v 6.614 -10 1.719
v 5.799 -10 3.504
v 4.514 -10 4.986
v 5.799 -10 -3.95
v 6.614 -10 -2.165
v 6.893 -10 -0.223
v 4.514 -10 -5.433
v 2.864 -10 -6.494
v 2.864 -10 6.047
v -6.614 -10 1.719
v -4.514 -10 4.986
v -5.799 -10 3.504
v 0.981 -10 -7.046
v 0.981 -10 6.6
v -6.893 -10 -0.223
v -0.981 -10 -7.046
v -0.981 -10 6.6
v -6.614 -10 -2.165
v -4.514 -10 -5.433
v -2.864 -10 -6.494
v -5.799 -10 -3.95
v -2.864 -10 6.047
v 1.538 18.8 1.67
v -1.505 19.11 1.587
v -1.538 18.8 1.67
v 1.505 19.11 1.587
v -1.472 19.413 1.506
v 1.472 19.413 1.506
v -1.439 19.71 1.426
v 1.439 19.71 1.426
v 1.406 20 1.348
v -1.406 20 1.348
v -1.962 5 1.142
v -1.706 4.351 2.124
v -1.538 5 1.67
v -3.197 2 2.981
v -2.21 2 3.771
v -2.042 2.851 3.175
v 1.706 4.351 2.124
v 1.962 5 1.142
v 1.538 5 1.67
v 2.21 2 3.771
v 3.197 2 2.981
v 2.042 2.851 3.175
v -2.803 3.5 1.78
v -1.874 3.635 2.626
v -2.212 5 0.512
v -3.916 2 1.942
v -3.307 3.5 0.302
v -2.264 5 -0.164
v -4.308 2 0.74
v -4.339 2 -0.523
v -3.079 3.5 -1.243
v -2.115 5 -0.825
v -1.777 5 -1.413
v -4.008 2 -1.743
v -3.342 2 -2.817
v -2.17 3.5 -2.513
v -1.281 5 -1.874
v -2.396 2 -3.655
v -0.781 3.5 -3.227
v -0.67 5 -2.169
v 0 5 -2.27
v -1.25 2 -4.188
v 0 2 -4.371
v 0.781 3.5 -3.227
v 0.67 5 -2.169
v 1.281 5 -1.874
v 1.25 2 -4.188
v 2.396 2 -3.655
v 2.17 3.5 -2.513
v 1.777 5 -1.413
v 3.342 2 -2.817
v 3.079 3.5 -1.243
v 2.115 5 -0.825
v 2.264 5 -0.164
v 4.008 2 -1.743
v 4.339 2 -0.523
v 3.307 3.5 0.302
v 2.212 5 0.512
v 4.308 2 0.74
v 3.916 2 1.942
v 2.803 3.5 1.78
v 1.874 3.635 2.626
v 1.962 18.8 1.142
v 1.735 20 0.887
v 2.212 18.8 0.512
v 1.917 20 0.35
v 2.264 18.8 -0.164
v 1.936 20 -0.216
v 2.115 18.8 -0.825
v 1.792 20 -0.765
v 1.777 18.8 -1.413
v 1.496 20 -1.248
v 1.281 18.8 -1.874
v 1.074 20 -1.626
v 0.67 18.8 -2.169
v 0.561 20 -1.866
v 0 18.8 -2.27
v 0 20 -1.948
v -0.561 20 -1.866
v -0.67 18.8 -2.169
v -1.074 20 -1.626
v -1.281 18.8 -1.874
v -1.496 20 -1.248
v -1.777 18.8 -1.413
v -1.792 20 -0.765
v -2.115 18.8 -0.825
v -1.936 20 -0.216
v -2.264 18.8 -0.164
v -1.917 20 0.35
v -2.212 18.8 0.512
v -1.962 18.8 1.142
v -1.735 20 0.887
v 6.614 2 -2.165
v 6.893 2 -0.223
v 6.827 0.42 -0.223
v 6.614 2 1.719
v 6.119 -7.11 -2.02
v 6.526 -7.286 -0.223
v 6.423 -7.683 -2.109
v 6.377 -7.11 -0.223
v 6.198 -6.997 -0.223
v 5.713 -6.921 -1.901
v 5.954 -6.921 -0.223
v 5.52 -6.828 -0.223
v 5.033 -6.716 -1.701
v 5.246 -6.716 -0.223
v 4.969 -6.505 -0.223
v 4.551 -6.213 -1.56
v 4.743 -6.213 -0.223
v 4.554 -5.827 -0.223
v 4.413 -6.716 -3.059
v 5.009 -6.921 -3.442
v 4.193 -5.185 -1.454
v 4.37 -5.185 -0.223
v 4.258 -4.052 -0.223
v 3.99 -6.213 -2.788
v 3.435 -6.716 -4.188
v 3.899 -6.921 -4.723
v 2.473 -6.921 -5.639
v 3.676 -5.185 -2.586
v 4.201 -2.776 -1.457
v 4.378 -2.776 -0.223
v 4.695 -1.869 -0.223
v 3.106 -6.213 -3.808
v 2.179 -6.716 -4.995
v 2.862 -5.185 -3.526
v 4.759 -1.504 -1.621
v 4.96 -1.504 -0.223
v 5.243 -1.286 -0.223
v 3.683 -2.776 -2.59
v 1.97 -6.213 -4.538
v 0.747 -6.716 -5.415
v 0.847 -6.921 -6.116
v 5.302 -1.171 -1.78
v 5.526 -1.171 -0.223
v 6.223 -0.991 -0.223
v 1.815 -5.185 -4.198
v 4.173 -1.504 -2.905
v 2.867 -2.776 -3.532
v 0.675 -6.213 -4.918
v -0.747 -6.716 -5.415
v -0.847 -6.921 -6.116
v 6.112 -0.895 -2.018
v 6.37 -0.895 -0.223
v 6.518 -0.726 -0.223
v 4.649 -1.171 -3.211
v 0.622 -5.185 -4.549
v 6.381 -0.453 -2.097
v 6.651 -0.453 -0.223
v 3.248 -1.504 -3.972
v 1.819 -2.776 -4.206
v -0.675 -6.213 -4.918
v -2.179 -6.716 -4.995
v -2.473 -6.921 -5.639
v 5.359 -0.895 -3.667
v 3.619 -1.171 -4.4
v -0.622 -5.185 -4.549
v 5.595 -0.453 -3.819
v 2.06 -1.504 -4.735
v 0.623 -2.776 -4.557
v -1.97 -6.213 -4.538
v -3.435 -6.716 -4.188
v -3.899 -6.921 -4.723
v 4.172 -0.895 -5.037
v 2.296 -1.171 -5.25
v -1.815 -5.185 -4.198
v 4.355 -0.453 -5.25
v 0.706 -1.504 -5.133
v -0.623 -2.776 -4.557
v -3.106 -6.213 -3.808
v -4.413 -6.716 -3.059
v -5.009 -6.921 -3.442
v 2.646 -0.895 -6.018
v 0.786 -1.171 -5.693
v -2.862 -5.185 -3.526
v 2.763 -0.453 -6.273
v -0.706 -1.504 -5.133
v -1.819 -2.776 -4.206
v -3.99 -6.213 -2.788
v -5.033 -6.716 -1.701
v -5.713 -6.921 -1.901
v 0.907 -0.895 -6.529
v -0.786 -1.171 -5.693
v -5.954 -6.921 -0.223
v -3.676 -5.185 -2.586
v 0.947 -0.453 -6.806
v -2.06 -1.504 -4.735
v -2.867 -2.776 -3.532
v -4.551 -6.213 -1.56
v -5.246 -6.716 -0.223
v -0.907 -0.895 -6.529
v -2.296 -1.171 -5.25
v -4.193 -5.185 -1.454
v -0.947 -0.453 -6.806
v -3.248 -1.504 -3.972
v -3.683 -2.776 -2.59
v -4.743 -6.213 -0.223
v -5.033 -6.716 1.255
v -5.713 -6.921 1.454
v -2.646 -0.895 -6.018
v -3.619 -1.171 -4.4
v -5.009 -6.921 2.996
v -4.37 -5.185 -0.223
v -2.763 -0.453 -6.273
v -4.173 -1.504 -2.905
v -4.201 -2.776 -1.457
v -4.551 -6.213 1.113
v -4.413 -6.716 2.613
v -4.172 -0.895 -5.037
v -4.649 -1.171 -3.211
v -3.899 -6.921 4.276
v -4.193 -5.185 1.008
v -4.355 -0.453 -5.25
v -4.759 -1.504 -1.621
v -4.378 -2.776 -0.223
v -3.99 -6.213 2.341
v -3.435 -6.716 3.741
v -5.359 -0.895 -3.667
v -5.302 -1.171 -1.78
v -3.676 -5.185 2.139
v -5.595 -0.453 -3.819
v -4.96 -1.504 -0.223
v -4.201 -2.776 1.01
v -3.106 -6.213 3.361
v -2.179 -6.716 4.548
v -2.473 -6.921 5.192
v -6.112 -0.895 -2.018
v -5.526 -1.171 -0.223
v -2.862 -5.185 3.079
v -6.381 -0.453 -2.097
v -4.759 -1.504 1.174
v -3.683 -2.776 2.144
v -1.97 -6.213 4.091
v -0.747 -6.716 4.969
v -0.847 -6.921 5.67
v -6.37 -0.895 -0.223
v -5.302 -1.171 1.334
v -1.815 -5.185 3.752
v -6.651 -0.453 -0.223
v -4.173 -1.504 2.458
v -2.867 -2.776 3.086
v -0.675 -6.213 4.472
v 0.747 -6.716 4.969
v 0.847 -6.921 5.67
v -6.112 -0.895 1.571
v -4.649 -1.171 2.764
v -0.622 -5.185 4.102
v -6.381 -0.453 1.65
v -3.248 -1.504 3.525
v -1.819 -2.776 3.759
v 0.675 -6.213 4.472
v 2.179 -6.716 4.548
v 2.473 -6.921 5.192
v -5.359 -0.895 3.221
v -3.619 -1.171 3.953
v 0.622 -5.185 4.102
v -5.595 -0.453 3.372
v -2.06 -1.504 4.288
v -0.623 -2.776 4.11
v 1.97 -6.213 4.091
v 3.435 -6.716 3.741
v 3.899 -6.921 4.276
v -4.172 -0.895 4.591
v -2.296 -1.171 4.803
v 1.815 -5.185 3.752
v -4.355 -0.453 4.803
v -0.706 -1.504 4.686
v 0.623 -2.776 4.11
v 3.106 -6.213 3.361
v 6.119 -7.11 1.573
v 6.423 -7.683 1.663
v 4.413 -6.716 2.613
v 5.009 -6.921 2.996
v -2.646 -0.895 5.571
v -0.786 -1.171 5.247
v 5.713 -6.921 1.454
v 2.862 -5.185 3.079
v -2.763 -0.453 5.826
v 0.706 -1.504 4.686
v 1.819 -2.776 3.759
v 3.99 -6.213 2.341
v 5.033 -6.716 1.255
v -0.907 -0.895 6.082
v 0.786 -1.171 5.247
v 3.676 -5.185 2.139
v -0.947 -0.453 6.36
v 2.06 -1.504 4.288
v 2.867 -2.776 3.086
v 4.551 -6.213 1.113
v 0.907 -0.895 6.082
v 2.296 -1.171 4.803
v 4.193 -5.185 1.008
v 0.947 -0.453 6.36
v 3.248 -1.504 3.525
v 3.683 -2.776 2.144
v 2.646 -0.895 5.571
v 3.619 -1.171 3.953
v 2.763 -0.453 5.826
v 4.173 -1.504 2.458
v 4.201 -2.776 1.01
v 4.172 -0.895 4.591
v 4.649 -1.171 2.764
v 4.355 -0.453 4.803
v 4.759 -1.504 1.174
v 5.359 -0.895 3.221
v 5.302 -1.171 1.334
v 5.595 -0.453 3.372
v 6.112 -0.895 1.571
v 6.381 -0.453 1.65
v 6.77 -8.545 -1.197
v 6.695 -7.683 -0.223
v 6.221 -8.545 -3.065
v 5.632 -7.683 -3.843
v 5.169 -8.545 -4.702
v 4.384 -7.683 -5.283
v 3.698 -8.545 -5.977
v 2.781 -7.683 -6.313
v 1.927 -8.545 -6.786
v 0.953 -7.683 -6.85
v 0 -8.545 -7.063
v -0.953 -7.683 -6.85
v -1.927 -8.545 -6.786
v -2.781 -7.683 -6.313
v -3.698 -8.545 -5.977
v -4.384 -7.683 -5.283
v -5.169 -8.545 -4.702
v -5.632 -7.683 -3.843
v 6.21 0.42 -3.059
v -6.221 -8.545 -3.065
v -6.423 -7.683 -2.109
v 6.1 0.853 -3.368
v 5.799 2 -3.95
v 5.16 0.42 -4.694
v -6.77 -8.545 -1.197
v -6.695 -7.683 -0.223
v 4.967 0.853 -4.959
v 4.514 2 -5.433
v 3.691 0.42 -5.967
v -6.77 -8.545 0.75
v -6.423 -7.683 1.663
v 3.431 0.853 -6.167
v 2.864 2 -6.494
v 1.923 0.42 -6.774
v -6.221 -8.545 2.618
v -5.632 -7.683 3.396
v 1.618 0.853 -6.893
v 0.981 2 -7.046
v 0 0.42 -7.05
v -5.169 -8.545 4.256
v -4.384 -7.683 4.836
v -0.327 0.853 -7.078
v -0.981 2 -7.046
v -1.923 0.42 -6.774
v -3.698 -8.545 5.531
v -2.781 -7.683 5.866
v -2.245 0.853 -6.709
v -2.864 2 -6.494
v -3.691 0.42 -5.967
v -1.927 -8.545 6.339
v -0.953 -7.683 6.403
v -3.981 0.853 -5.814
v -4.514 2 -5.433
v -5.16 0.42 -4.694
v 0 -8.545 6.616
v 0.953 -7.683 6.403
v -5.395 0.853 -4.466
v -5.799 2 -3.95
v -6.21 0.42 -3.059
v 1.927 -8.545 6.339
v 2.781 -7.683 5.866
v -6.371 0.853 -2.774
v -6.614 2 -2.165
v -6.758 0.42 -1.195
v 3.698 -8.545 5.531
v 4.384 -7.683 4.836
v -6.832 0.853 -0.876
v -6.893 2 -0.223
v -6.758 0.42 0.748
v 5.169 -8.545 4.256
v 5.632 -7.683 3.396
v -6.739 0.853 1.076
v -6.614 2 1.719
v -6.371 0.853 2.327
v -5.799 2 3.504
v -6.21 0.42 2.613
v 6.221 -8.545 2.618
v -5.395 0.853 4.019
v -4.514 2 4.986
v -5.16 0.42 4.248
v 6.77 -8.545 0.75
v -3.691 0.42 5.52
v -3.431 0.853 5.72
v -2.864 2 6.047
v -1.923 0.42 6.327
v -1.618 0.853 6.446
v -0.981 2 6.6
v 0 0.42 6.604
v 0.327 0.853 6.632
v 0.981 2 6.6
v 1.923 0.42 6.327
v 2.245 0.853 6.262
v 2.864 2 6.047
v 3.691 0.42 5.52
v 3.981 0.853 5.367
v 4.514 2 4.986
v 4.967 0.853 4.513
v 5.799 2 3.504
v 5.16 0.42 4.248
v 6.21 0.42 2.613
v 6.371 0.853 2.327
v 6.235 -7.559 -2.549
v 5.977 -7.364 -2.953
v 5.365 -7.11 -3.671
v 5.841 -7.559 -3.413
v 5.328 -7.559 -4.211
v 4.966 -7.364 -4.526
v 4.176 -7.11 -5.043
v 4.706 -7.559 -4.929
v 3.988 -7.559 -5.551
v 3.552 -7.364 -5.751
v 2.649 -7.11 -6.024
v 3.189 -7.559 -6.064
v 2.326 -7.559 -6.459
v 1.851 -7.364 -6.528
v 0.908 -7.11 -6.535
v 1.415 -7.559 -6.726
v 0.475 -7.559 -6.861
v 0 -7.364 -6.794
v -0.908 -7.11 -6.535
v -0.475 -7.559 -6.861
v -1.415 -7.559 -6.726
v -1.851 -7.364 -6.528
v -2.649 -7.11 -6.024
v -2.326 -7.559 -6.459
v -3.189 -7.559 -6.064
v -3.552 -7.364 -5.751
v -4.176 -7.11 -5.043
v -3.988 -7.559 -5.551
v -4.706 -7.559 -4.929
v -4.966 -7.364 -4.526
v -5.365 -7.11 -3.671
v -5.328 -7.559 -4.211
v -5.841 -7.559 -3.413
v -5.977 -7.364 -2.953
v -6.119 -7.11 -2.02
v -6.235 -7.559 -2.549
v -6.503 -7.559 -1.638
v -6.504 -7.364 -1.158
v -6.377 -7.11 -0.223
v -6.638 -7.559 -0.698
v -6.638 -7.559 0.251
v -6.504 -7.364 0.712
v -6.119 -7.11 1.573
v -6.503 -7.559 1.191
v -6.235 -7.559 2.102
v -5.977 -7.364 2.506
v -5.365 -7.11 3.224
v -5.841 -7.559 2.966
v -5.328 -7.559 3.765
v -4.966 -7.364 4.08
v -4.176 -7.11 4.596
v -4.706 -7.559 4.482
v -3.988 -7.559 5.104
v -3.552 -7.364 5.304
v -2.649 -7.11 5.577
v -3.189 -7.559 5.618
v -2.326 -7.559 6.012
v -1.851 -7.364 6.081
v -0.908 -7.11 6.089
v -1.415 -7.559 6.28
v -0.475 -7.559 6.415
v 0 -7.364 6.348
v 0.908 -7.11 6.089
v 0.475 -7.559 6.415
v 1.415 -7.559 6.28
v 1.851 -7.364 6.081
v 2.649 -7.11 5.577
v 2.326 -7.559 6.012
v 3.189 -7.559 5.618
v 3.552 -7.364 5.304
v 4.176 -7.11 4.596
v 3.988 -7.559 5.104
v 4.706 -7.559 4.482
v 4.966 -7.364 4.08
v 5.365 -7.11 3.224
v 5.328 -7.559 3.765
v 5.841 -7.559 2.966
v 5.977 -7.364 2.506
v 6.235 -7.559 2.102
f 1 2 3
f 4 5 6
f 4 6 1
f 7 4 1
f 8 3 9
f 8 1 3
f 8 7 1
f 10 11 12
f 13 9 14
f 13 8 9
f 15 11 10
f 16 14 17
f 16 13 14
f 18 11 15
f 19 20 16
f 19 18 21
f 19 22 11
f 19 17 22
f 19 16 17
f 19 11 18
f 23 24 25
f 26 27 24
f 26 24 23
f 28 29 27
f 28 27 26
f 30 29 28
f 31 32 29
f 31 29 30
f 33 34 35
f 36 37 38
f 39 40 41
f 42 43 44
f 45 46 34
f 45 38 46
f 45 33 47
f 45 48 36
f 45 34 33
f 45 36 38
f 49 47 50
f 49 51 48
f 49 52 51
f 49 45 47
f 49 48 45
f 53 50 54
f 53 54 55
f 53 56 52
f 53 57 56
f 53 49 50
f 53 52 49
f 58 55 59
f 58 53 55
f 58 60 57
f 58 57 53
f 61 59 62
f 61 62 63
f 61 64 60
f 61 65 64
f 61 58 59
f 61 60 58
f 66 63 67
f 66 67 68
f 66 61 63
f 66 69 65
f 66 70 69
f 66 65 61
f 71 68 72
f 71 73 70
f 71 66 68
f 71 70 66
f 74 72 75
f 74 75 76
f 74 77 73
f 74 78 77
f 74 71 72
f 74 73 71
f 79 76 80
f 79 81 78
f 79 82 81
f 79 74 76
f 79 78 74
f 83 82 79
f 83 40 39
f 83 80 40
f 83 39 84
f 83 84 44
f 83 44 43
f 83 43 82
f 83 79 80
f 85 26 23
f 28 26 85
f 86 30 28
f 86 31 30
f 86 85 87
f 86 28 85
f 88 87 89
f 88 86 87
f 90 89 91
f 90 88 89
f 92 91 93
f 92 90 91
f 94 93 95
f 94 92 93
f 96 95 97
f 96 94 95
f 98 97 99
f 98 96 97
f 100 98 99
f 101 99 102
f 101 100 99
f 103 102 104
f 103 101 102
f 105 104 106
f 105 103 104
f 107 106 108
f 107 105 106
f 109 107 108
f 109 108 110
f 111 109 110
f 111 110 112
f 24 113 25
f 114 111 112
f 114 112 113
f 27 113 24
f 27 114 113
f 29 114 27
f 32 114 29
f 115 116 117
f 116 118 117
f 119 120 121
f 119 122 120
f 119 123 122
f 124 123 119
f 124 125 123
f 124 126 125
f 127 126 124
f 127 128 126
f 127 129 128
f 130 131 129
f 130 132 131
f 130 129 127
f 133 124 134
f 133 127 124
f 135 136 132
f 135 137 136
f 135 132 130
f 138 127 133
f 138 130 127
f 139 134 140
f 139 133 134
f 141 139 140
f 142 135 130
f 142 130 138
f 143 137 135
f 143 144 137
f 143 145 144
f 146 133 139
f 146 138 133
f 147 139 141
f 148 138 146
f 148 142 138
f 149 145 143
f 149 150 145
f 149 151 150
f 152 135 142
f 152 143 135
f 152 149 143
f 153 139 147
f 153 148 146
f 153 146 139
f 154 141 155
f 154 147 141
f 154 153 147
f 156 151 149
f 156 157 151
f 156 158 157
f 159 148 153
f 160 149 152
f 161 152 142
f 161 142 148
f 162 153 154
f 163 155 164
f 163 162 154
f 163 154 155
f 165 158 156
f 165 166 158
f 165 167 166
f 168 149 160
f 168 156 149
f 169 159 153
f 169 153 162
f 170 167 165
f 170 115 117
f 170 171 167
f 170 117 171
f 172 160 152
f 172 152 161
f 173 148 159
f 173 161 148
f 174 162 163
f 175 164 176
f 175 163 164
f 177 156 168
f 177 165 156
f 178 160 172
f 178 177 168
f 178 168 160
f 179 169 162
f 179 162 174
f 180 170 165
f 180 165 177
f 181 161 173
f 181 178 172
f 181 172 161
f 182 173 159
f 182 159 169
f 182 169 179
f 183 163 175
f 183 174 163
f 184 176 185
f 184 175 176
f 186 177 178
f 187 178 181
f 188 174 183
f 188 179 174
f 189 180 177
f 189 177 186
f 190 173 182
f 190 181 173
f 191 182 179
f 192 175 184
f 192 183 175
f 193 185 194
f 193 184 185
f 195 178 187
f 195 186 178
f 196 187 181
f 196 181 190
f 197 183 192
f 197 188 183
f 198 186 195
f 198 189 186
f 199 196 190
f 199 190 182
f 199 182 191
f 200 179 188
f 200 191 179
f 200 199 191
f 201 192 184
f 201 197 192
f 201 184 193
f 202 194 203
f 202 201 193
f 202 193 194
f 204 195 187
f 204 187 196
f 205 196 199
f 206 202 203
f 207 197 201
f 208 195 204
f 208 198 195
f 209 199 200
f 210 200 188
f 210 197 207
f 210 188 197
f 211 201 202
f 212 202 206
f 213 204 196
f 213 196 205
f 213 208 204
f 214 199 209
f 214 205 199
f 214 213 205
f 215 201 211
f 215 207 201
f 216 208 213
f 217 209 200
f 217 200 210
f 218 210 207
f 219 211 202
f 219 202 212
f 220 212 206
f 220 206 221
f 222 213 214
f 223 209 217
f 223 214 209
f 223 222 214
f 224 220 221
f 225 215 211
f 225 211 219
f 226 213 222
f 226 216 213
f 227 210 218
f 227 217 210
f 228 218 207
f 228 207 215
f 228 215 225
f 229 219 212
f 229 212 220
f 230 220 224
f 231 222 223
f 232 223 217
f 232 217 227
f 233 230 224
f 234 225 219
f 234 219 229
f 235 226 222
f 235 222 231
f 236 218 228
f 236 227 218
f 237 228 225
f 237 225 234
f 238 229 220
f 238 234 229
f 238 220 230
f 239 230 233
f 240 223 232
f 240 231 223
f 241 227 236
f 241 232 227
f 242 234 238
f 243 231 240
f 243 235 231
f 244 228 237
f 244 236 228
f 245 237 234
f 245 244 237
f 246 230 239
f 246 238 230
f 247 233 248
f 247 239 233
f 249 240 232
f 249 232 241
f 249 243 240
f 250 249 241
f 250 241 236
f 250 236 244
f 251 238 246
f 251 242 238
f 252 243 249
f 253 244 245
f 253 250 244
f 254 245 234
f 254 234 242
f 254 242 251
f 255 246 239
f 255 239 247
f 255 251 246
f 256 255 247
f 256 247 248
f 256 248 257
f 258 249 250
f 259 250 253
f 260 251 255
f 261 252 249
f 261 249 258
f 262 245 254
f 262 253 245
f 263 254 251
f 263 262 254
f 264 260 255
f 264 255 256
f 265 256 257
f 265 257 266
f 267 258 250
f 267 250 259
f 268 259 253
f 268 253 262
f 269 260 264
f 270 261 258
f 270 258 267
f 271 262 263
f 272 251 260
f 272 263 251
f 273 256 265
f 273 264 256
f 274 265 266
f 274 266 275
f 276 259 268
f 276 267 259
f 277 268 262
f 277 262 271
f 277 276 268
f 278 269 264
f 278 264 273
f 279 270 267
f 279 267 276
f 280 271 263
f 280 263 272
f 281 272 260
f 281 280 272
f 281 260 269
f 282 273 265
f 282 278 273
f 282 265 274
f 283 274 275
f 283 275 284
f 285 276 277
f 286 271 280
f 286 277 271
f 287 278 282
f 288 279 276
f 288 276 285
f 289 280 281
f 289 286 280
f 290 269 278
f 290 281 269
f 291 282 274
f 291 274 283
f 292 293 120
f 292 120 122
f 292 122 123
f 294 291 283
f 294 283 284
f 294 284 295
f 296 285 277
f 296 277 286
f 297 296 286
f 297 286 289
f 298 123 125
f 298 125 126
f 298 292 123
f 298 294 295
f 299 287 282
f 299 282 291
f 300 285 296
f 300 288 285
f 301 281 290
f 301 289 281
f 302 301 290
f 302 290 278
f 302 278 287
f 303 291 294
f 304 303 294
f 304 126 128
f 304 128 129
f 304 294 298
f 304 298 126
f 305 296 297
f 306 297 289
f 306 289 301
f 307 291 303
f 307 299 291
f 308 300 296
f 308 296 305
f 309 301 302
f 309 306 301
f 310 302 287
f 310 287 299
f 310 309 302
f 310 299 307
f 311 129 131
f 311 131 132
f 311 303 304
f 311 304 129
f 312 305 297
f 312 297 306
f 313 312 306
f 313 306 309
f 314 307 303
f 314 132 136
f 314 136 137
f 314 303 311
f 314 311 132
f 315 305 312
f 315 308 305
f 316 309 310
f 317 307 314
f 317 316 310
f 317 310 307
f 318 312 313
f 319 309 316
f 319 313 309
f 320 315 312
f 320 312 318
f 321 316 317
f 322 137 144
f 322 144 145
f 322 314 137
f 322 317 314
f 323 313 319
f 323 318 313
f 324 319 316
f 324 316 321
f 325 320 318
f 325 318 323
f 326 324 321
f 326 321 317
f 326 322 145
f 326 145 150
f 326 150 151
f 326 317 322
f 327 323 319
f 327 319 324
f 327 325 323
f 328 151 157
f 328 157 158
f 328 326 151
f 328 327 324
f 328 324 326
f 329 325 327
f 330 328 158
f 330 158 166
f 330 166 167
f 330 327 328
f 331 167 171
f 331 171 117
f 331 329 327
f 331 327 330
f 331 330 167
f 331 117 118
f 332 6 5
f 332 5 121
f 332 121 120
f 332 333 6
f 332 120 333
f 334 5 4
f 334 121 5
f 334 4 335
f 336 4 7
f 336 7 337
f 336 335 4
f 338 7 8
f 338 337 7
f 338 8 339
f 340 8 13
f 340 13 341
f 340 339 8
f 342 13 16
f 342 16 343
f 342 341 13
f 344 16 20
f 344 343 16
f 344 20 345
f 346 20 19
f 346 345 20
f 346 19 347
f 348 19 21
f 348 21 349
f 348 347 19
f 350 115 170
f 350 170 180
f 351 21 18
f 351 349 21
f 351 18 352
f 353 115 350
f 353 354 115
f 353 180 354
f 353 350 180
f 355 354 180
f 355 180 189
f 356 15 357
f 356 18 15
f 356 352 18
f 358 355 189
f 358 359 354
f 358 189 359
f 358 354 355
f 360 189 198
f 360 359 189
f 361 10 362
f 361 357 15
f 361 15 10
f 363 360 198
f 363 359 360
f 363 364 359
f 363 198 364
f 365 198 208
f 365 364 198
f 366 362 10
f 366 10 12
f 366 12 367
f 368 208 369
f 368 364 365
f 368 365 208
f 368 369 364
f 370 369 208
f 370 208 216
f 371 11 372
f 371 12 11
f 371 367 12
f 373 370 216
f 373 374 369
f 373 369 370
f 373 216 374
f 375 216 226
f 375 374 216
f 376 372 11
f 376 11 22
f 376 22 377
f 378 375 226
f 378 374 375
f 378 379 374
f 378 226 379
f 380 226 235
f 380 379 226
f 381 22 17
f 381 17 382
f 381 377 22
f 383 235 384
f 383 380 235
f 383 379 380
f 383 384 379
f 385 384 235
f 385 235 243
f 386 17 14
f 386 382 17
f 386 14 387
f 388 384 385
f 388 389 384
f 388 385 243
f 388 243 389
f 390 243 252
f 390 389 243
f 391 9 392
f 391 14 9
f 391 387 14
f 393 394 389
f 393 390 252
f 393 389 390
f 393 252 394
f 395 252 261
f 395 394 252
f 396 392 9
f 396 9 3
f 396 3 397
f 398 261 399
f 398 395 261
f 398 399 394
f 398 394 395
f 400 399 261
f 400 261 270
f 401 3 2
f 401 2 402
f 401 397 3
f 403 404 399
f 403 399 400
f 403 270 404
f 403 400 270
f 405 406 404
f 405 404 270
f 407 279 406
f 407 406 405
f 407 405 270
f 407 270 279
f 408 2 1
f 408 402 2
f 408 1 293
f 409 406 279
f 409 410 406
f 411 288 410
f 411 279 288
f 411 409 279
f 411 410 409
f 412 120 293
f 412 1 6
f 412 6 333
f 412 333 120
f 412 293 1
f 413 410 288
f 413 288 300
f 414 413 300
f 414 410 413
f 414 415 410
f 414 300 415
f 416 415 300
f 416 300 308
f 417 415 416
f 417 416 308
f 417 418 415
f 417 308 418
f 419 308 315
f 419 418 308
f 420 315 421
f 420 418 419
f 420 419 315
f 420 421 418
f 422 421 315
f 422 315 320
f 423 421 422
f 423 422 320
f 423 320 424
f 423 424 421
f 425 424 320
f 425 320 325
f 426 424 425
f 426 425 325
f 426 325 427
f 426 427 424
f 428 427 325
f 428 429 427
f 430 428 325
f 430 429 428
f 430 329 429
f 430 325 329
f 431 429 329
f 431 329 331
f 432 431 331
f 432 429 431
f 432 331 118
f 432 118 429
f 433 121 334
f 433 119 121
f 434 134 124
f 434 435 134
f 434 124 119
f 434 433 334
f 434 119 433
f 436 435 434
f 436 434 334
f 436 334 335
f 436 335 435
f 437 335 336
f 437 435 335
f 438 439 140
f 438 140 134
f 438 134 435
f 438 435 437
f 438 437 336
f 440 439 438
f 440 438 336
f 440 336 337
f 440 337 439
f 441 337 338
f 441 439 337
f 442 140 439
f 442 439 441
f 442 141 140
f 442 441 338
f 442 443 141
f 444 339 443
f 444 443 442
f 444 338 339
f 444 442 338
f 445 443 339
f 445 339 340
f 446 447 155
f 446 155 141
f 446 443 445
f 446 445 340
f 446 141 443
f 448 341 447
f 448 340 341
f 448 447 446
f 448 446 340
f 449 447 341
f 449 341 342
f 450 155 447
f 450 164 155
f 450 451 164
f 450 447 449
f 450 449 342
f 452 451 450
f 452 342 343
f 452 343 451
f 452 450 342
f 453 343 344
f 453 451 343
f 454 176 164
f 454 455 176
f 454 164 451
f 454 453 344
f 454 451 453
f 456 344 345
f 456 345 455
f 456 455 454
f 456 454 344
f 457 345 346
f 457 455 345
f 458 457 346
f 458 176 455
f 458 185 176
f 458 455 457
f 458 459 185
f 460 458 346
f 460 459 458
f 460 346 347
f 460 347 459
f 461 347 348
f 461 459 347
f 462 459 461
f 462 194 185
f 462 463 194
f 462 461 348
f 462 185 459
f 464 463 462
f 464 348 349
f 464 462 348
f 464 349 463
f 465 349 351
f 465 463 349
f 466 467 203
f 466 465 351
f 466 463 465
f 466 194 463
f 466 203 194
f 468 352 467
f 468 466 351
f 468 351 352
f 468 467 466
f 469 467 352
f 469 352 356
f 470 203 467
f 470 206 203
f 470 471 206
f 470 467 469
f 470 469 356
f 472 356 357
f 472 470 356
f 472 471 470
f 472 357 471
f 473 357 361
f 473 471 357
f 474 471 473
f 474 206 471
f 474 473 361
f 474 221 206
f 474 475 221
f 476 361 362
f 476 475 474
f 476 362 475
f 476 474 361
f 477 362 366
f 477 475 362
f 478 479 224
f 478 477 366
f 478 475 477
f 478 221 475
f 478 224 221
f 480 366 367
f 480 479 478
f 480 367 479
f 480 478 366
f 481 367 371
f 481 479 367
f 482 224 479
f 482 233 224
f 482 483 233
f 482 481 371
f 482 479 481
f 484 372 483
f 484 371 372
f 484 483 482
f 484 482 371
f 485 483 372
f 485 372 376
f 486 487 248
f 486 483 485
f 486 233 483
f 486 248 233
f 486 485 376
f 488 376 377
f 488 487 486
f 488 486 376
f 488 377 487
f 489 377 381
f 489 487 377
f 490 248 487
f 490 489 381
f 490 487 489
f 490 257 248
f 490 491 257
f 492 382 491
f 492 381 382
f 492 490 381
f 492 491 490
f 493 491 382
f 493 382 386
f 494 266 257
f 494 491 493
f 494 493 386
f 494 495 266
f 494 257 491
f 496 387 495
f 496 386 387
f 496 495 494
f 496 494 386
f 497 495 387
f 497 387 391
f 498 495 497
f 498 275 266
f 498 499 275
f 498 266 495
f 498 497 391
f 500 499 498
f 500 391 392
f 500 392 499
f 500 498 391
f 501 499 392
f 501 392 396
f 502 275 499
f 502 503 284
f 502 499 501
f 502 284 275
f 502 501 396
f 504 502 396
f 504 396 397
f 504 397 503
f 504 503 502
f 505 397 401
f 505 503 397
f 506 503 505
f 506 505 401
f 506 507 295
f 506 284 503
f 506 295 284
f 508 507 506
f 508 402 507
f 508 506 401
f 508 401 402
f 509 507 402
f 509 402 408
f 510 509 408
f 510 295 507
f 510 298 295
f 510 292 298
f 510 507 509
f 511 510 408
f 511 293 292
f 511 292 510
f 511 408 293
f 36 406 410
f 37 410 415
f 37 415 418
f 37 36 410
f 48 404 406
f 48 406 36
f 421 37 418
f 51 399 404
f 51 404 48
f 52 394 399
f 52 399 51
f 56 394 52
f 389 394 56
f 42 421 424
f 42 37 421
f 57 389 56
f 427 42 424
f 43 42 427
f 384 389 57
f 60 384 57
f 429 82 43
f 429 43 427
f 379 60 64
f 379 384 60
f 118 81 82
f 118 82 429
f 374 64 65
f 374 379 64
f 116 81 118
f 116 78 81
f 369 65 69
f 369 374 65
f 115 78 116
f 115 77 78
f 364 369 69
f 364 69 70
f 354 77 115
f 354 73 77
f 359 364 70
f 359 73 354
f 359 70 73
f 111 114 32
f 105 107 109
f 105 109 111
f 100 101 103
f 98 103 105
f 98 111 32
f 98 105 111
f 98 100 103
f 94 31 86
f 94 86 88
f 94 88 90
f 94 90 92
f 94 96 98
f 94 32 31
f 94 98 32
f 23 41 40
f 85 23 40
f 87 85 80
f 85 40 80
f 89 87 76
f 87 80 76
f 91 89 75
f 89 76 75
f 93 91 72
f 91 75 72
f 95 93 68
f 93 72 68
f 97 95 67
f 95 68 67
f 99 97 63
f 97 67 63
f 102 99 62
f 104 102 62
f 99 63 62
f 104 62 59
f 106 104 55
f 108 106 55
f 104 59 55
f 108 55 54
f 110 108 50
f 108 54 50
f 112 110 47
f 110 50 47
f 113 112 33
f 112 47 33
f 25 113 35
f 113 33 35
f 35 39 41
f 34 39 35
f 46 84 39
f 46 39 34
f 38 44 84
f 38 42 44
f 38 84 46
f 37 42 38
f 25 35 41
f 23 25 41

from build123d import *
from OCP.BRepFilletAPI import BRepFilletAPI_MakeChamfer

# Parameters (mm, degrees)
BOSS_EXTRUDE1_DEPTH = 20
CHAMFER1_SIZE       = 1.2
CHAMFER1_SIZE2      = 0.321539031
CHAMFER2_SIZE       = 3
CHAMFER2_SIZE2      = 2.100622615


# Read off the part's stored shape, not the designer's step: Revolve1
with BuildPart() as part:
    # Sketch1 → Boss-Extrude1 (new body)
    with BuildSketch(Plane(origin=(0, 0, 0), x_dir=(1, 0, 0), z_dir=(0, 1, 0))):
        with BuildLine():
            Line((-1.537530488, -1.67), (1.537530488, -1.67))
            ThreePointArc((1.537530488, -1.67), (0, 2.27), (-1.537530488, -1.67))
        make_face()
    extrude(amount=BOSS_EXTRUDE1_DEPTH)

    # Chamfer1: one chamfer whose edges measure the first distance from different faces: ONE call of the kernel's chamfer builder (chamfer() names one face for all edges)
    chamfer1_edges_1 = [part.edges().sort_by_distance(p)[0] for p in [
        (0, 20, -2.27),
    ]]
    chamfer1_side_1 = [part.faces().sort_by_distance(p)[0] for p in [
        (0, 10, -2.27),
    ]]
    chamfer1_edges_2 = [part.edges().sort_by_distance(p)[0] for p in [
        (0, 20, 1.67),
    ]]
    chamfer1_side_2 = [part.faces().sort_by_distance(p)[0] for p in [
        (0, 10, 1.67),
    ]]
    chamfer1 = BRepFilletAPI_MakeChamfer(part.part.solid().wrapped)
    for e in chamfer1_edges_1:
        chamfer1.Add(CHAMFER1_SIZE, CHAMFER1_SIZE2, e.wrapped, chamfer1_side_1[0].wrapped)  # the first distance lies on this face
    for e in chamfer1_edges_2:
        chamfer1.Add(CHAMFER1_SIZE, CHAMFER1_SIZE2, e.wrapped, chamfer1_side_2[0].wrapped)  # the first distance lies on this face
    add(Compound.cast(chamfer1.Shape()), mode=Mode.REPLACE)

    # Revolve1 outline → Revolve1 (revolve)
    with BuildSketch(Plane.XY.offset(-0.223266571)):
        with BuildLine():
            Line((6.893266571, 2), (1.893266571, 2))
            Line((1.893266571, 2), (1.893266571, 0))
            Line((1.893266571, 0), (0, 0))
            Line((0, 0), (0, -10))
            Line((0, -10), (6.893266571, -10))
            add(Edge.make_bspline(
                [(6.893266571, -10), (6.893266571, -0.153248468), (2.676005531, -20.148158745), (2.676005531, 12.148158745), (6.893266571, -7.846751532), (6.893266571, 2)],
                knots=[0.057927251, 0.057927251, 0.057927251, 0.057927251, 0.057927251, 0.057927251, 1.057927251, 1.057927251, 1.057927251, 1.057927251, 1.057927251, 1.057927251], degree=5))
        make_face()
    revolve(axis=Axis((0, 0, -0.223266571), (0, 1, 0)))

    # Chamfer2: one chamfer whose edges measure the first distance from different faces: ONE call of the kernel's chamfer builder (chamfer() names one face for all edges)
    chamfer2_edges_1 = [part.edges().sort_by_distance(p)[0] for p in [
        (0, 2, 1.67),
    ]]
    chamfer2_side_1 = [part.faces().sort_by_distance(p)[0] for p in [
        (0, 10.4, 1.67),
    ]]
    chamfer2_edges_2 = [part.edges().sort_by_distance(p)[0] for p in [
        (0, 2, -2.27),
    ]]
    chamfer2_side_2 = [part.faces().sort_by_distance(p)[0] for p in [
        (0, 10.4, -2.27),
    ]]
    chamfer2 = BRepFilletAPI_MakeChamfer(part.part.solid().wrapped)
    for e in chamfer2_edges_1:
        chamfer2.Add(CHAMFER2_SIZE, CHAMFER2_SIZE2, e.wrapped, chamfer2_side_1[0].wrapped)  # the first distance lies on this face
    for e in chamfer2_edges_2:
        chamfer2.Add(CHAMFER2_SIZE, CHAMFER2_SIZE2, e.wrapped, chamfer2_side_2[0].wrapped)  # the first distance lies on this face
    add(Compound.cast(chamfer2.Shape()), mode=Mode.REPLACE)


solid = part.part
